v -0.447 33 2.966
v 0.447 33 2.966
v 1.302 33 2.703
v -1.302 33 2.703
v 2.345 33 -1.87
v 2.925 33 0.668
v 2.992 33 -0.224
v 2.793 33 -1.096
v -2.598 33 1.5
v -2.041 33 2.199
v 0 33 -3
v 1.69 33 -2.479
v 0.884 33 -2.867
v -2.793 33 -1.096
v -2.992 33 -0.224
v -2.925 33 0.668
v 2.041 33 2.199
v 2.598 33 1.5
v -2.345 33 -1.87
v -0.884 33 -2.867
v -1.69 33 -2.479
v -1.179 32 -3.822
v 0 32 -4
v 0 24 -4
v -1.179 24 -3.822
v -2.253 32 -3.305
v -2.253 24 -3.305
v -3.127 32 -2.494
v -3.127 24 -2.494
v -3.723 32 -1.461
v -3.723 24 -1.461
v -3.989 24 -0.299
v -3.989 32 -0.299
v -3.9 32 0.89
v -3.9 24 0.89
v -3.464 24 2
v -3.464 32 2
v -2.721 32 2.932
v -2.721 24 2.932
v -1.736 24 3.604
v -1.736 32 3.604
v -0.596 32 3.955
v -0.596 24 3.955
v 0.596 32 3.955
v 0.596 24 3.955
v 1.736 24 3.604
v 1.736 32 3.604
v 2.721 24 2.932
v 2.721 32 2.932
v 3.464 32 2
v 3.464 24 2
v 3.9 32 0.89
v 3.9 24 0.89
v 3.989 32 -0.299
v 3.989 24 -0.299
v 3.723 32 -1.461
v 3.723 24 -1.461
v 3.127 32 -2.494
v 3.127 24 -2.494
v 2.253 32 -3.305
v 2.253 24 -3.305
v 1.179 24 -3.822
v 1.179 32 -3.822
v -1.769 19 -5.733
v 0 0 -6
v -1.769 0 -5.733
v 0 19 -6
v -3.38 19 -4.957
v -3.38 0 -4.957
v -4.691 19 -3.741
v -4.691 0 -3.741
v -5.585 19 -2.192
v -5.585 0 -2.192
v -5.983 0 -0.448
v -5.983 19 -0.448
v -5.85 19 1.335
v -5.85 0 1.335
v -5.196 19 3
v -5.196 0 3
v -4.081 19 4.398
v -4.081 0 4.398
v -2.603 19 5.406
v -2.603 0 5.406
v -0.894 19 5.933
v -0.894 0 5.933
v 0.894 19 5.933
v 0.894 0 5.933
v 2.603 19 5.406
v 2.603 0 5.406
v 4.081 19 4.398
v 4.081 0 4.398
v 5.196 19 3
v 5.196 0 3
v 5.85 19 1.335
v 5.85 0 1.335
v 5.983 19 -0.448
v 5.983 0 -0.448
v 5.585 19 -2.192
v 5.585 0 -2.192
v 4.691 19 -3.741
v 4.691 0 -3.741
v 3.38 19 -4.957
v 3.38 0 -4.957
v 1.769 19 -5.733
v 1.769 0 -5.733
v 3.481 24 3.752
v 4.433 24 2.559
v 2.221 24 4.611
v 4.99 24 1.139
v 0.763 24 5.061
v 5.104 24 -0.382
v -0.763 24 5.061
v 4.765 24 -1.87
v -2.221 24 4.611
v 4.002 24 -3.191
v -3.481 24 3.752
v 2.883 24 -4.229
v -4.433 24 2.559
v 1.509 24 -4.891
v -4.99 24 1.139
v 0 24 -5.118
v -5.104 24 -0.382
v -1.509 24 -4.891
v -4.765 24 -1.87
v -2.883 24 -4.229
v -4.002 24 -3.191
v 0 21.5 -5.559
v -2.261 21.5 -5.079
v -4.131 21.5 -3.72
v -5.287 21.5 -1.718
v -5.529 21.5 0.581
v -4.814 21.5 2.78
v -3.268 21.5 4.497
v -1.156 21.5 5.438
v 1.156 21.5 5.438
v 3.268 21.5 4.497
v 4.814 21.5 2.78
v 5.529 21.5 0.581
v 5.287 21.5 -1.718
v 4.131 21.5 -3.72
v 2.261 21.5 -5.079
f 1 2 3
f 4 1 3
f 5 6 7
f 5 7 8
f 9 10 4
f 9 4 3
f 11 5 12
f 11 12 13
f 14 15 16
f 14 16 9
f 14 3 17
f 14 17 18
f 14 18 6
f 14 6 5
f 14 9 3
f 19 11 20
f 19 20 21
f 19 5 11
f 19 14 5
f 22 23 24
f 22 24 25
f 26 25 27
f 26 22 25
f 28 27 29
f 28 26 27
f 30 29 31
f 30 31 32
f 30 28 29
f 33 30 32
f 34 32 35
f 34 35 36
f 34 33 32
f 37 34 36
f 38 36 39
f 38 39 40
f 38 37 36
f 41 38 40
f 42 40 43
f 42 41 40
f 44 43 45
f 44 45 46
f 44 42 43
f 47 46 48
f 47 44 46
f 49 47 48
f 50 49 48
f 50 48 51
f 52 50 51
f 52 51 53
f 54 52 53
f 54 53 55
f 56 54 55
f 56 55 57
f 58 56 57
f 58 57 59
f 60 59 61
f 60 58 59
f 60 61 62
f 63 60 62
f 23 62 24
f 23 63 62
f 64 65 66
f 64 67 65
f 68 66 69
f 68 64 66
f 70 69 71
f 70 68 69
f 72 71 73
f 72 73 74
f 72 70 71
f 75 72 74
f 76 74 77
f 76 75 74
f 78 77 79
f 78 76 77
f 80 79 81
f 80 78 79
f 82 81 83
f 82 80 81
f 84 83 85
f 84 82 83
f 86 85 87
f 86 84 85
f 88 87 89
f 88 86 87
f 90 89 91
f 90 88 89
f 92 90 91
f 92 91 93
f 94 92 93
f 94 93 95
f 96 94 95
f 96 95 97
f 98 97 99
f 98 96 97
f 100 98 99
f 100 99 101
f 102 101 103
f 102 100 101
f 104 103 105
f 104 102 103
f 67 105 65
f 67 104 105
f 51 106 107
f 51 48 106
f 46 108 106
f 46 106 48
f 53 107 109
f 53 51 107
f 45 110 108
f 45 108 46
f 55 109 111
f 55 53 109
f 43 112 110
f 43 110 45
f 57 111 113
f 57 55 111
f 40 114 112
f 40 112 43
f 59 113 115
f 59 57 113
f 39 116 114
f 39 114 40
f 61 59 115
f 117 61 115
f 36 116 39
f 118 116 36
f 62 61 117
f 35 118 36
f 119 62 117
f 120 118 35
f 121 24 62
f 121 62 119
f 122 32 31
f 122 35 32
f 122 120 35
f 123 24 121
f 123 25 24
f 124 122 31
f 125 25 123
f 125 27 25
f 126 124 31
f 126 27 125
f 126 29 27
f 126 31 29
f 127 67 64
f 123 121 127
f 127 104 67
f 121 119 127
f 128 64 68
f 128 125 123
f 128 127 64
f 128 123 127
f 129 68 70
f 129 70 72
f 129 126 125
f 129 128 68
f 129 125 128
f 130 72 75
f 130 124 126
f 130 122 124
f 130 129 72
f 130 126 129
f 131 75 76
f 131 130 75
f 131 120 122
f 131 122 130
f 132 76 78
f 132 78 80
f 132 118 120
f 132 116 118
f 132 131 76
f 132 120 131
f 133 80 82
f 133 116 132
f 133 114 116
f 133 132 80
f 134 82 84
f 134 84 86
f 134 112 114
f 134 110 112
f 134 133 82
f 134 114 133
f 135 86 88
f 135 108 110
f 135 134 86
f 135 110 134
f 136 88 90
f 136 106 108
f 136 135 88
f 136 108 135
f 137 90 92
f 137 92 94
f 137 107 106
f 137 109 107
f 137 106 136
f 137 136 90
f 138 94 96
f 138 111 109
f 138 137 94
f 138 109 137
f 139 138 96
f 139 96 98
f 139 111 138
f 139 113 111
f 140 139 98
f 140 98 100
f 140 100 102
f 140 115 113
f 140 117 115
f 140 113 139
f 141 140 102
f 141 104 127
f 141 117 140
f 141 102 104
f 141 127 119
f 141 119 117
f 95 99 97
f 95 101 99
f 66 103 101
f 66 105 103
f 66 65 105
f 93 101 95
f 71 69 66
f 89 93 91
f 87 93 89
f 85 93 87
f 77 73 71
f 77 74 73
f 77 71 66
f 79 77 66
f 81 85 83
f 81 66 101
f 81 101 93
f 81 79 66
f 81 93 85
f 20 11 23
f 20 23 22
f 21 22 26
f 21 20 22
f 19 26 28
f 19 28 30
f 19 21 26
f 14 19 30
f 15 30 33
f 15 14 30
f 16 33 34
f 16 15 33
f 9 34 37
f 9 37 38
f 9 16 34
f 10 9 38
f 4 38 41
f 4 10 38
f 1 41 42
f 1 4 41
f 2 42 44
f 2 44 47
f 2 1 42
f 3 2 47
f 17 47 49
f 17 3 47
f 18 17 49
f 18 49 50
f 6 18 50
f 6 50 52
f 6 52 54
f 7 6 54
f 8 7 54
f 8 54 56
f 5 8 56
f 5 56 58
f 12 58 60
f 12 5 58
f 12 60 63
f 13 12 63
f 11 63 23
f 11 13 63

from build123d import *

# Parameters (mm, degrees)
CHANFREIN1_SIZE = 1


with BuildPart() as part:
    # Esquisse1 → Révolution1 (revolve)
    with BuildSketch(Plane.XY, mode=Mode.PRIVATE) as r_volution1_sk:
        Polygon((0, 0), (6, 0), (6, 19), (5.118365096, 24), (4, 24), (4, 33), (0, 33), align=None)
    revolve(r_volution1_sk.sketch.rotate(Axis((0, 0, 0), (0, 1, 0)), 90), axis=Axis((0, 0, 0), (0, 1, 0)))

    # Chanfrein1
    chanfrein1_edges = [part.edges().sort_by_distance(p)[0] for p in [
        (0, 33, 4),
    ]]
    chamfer(chanfrein1_edges, length=CHANFREIN1_SIZE)


solid = part.part
